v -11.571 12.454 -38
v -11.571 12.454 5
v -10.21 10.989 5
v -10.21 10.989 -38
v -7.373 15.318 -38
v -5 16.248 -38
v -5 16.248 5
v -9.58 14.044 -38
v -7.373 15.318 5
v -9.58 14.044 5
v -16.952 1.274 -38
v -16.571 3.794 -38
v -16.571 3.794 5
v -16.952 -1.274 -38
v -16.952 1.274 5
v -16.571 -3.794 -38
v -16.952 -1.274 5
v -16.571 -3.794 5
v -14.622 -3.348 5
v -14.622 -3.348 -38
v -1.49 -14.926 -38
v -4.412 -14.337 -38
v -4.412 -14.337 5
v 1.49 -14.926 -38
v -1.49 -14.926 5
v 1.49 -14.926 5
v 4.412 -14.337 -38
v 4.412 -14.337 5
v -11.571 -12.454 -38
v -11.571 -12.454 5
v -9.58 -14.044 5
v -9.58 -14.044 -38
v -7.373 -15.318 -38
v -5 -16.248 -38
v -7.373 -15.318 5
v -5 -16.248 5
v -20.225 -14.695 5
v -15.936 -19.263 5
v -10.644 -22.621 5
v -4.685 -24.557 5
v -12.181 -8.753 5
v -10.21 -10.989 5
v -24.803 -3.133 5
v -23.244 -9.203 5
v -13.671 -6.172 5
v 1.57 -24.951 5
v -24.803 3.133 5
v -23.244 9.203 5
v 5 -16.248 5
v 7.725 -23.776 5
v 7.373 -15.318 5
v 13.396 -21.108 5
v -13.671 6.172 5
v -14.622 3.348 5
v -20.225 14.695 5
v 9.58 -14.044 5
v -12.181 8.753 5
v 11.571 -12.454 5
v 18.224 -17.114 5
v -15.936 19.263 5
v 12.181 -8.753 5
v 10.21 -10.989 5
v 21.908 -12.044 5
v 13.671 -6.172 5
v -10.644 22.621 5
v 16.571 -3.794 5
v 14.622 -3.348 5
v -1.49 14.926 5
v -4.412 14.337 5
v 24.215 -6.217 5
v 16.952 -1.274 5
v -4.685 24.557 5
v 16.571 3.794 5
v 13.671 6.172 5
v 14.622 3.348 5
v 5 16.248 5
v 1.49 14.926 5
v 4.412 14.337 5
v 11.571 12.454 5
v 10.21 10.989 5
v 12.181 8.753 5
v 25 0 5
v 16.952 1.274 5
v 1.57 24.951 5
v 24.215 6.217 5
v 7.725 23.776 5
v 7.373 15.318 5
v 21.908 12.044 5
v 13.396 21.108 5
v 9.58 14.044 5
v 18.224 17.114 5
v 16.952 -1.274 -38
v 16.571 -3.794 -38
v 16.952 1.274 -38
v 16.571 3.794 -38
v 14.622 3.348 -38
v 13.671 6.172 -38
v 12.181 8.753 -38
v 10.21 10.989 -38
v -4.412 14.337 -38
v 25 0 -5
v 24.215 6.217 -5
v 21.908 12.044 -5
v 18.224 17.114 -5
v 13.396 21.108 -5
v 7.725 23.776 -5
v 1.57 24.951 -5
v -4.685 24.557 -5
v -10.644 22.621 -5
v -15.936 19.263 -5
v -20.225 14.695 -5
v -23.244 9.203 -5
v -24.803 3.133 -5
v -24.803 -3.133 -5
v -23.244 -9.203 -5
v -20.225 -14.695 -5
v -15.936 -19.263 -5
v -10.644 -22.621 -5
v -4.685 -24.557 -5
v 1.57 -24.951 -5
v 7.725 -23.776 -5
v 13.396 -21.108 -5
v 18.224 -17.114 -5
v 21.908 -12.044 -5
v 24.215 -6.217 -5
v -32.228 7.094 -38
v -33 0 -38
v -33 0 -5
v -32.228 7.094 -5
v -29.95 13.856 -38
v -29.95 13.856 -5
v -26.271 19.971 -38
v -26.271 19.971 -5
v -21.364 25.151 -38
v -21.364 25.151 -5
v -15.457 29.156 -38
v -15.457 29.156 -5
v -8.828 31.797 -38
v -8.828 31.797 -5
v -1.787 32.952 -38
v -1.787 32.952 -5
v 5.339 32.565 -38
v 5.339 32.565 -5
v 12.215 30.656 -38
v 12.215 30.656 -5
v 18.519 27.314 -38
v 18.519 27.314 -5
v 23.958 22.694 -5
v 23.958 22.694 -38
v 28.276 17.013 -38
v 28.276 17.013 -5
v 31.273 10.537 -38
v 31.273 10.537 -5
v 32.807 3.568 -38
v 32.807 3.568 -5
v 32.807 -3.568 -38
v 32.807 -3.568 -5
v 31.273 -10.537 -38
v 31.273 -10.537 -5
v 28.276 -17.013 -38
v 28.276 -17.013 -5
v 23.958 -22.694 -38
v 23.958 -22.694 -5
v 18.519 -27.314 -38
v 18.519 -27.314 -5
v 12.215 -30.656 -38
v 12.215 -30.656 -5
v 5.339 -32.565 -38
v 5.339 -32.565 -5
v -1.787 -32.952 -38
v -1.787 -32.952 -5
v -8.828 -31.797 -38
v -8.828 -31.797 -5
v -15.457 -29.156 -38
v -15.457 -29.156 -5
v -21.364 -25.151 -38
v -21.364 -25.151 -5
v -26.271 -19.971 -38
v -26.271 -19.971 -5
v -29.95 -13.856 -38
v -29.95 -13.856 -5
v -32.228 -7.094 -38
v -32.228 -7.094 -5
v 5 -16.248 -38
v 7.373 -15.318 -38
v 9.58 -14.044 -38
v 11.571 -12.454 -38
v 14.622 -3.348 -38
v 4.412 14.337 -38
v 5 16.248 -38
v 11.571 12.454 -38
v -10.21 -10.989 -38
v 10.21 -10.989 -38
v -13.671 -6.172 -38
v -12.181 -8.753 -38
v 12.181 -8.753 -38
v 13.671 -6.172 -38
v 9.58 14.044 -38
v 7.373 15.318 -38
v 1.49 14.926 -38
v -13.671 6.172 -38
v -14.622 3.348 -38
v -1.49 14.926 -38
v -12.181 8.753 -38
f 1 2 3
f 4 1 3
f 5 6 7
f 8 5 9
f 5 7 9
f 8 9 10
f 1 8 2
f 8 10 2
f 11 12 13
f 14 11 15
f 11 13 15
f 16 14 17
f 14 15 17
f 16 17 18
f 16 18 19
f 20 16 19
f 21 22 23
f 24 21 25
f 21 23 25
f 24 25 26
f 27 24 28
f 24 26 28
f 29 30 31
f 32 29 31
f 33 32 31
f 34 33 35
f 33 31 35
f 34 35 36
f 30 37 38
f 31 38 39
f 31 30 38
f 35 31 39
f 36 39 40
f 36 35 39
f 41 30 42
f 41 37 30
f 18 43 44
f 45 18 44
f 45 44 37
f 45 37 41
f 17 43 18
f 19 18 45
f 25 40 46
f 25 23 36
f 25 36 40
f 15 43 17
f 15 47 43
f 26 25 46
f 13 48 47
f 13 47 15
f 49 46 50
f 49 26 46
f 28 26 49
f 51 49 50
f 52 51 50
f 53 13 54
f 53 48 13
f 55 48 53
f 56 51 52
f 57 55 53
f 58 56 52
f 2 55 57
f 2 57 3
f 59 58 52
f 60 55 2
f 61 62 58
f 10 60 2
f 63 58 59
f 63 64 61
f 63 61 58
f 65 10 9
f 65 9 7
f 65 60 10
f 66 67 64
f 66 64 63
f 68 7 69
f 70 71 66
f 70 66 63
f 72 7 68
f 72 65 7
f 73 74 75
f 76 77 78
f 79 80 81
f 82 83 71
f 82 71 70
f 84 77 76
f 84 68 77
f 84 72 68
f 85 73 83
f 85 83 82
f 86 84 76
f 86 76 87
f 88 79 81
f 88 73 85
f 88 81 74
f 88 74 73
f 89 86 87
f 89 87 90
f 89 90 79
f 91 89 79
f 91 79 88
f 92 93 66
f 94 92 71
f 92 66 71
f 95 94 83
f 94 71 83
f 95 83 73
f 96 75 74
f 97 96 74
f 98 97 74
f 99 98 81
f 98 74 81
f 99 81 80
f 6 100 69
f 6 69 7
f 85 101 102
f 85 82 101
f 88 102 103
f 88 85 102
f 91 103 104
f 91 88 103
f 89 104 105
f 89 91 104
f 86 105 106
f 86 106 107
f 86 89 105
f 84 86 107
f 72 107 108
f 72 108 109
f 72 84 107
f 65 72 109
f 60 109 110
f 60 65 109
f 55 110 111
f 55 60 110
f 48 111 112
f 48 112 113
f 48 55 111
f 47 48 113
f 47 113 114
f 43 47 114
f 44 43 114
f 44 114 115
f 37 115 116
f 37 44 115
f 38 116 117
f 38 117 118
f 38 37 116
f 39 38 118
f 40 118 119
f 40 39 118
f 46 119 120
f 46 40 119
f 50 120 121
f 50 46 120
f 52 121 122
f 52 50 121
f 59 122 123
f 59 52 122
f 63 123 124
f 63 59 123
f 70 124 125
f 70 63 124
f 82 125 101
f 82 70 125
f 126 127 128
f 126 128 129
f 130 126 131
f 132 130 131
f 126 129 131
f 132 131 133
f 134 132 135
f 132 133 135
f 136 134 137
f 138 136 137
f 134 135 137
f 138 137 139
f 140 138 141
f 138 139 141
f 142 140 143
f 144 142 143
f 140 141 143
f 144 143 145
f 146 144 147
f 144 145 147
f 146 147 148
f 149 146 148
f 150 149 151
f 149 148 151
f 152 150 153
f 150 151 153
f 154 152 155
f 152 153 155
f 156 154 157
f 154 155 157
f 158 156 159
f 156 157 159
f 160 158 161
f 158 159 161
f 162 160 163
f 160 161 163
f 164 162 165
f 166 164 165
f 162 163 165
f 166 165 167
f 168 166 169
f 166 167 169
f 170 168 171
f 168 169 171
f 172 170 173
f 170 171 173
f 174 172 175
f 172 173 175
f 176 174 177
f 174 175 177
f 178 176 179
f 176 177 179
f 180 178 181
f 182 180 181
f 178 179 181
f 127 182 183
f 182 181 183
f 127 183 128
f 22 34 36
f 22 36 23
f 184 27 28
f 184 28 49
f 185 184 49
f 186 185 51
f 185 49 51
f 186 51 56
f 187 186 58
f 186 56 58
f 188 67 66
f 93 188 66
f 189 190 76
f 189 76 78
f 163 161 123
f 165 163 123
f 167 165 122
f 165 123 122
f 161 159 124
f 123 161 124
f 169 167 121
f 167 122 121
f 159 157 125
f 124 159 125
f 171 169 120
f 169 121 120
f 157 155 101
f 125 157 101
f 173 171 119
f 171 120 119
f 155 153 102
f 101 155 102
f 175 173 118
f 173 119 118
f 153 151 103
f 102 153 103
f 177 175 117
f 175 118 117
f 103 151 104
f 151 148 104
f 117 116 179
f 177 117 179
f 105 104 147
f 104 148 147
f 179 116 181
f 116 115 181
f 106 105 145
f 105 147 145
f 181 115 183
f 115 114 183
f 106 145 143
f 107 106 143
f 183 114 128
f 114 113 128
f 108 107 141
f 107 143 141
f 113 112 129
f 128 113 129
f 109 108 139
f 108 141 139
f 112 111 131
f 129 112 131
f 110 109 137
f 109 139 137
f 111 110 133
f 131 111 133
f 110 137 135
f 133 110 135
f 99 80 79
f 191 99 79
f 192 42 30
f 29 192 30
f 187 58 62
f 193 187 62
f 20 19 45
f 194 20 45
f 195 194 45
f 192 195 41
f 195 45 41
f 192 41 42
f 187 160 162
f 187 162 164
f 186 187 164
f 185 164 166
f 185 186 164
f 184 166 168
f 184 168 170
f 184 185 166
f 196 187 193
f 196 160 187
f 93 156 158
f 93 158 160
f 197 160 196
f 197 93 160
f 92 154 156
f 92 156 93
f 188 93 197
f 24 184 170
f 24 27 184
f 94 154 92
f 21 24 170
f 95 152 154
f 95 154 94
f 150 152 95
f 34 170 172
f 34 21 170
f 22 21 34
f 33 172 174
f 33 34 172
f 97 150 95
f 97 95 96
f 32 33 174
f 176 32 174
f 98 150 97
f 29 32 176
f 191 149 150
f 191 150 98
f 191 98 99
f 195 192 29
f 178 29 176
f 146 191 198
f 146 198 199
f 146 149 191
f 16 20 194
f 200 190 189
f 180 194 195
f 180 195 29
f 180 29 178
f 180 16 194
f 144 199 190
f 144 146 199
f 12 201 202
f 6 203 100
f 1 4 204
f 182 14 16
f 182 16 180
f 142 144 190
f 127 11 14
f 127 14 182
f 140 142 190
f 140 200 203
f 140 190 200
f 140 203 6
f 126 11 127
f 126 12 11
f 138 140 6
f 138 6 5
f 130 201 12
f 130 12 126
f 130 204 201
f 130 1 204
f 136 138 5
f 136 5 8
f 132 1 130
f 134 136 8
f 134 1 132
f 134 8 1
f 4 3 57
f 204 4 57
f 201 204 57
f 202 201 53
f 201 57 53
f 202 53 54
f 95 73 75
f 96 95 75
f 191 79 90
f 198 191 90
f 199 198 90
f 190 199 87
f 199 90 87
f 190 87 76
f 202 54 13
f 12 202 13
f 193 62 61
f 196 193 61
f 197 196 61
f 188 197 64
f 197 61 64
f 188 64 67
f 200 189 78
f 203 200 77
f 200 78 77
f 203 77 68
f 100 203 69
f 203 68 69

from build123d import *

# Parameters (mm, degrees)
IZIM1_R                     = 25
Y_KSEKLIK_EKSTR_ZYON1_DEPTH = 5
IZIM2_R                     = 33
Y_KSEKLIK_EKSTR_ZYON2_DEPTH = 33


with BuildPart() as part:
    # Çizim1 → Yükseklik-Ekstrüzyon1 (new body, symmetric)
    with BuildSketch(Plane.XY):
        Circle(IZIM1_R)
        with BuildLine():
            Line((-5, 16.248076809), (-4.411764706, 14.336538361))
            ThreePointArc((-4.411764706, 14.336538361), (0, 15), (4.411764706, 14.336538361))
            Line((4.411764706, 14.336538361), (5, 16.248076809))
            ThreePointArc((5, 16.248076809), (8.5, 14.722431864), (11.571247279, 12.454165424))
            Line((11.571247279, 12.454165424), (10.20992407, 10.988969491))
            ThreePointArc((10.20992407, 10.988969491), (12.990381057, 7.5), (14.621688776, 3.34756887))
            Line((14.621688776, 3.34756887), (16.571247279, 3.793911386))
            ThreePointArc((16.571247279, 3.793911386), (17, 0), (16.571247279, -3.793911386))
            Line((16.571247279, -3.793911386), (14.621688776, -3.34756887))
            ThreePointArc((14.621688776, -3.34756887), (12.990381057, -7.5), (10.20992407, -10.988969491))
            Line((10.20992407, -10.988969491), (11.571247279, -12.454165424))
            ThreePointArc((11.571247279, -12.454165424), (8.5, -14.722431864), (5, -16.248076809))
            Line((5, -16.248076809), (4.411764706, -14.336538361))
            ThreePointArc((4.411764706, -14.336538361), (0, -15), (-4.411764706, -14.336538361))
            Line((-4.411764706, -14.336538361), (-5, -16.248076809))
            ThreePointArc((-5, -16.248076809), (-8.5, -14.722431864), (-11.571247279, -12.454165424))
            Line((-11.571247279, -12.454165424), (-10.20992407, -10.988969491))
            ThreePointArc((-10.20992407, -10.988969491), (-12.990381057, -7.5), (-14.621688776, -3.34756887))
            Line((-14.621688776, -3.34756887), (-16.571247279, -3.793911386))
            ThreePointArc((-16.571247279, -3.793911386), (-17, 0), (-16.571247279, 3.793911386))
            Line((-16.571247279, 3.793911386), (-14.621688776, 3.34756887))
            ThreePointArc((-14.621688776, 3.34756887), (-12.990381057, 7.5), (-10.20992407, 10.988969491))
            Line((-10.20992407, 10.988969491), (-11.571247279, 12.454165424))
            ThreePointArc((-11.571247279, 12.454165424), (-8.5, 14.722431864), (-5, 16.248076809))
        make_face(mode=Mode.SUBTRACT)
    extrude(amount=Y_KSEKLIK_EKSTR_ZYON1_DEPTH, both=True)

    # Çizim2 → Yükseklik-Ekstrüzyon2 (add)
    with BuildSketch(Plane(origin=(0, 0, -5), x_dir=(-1, 0, 0), z_dir=(0, 0, -1))):
        Circle(IZIM2_R)
        with BuildLine():
            Line((-5, 16.248076809), (-4.411764706, 14.336538361))
            ThreePointArc((-4.411764706, 14.336538361), (0, 15), (4.411764706, 14.336538361))
            Line((4.411764706, 14.336538361), (5, 16.248076809))
            ThreePointArc((5, 16.248076809), (8.5, 14.722431864), (11.571247279, 12.454165424))
            Line((11.571247279, 12.454165424), (10.20992407, 10.988969491))
            ThreePointArc((10.20992407, 10.988969491), (12.990381057, 7.5), (14.621688776, 3.34756887))
            Line((14.621688776, 3.34756887), (16.571247279, 3.793911386))
            ThreePointArc((16.571247279, 3.793911386), (17, 0), (16.571247279, -3.793911386))
            Line((16.571247279, -3.793911386), (14.621688776, -3.34756887))
            ThreePointArc((14.621688776, -3.34756887), (12.990381057, -7.5), (10.20992407, -10.988969491))
            Line((10.20992407, -10.988969491), (11.571247279, -12.454165424))
            ThreePointArc((11.571247279, -12.454165424), (8.5, -14.722431864), (5, -16.248076809))
            Line((5, -16.248076809), (4.411764706, -14.336538361))
            ThreePointArc((4.411764706, -14.336538361), (0, -15), (-4.411764706, -14.336538361))
            Line((-4.411764706, -14.336538361), (-5, -16.248076809))
            ThreePointArc((-5, -16.248076809), (-8.5, -14.722431864), (-11.571247279, -12.454165424))
            Line((-11.571247279, -12.454165424), (-10.20992407, -10.988969491))
            ThreePointArc((-10.20992407, -10.988969491), (-12.990381057, -7.5), (-14.621688776, -3.34756887))
            Line((-14.621688776, -3.34756887), (-16.571247279, -3.793911386))
            ThreePointArc((-16.571247279, -3.793911386), (-17, 0), (-16.571247279, 3.793911386))
            Line((-16.571247279, 3.793911386), (-14.621688776, 3.34756887))
            ThreePointArc((-14.621688776, 3.34756887), (-12.990381057, 7.5), (-10.20992407, 10.988969491))
            Line((-10.20992407, 10.988969491), (-11.571247279, 12.454165424))
            ThreePointArc((-11.571247279, 12.454165424), (-8.5, 14.722431864), (-5, 16.248076809))
        make_face(mode=Mode.SUBTRACT)
    extrude(amount=Y_KSEKLIK_EKSTR_ZYON2_DEPTH)


solid = part.part
